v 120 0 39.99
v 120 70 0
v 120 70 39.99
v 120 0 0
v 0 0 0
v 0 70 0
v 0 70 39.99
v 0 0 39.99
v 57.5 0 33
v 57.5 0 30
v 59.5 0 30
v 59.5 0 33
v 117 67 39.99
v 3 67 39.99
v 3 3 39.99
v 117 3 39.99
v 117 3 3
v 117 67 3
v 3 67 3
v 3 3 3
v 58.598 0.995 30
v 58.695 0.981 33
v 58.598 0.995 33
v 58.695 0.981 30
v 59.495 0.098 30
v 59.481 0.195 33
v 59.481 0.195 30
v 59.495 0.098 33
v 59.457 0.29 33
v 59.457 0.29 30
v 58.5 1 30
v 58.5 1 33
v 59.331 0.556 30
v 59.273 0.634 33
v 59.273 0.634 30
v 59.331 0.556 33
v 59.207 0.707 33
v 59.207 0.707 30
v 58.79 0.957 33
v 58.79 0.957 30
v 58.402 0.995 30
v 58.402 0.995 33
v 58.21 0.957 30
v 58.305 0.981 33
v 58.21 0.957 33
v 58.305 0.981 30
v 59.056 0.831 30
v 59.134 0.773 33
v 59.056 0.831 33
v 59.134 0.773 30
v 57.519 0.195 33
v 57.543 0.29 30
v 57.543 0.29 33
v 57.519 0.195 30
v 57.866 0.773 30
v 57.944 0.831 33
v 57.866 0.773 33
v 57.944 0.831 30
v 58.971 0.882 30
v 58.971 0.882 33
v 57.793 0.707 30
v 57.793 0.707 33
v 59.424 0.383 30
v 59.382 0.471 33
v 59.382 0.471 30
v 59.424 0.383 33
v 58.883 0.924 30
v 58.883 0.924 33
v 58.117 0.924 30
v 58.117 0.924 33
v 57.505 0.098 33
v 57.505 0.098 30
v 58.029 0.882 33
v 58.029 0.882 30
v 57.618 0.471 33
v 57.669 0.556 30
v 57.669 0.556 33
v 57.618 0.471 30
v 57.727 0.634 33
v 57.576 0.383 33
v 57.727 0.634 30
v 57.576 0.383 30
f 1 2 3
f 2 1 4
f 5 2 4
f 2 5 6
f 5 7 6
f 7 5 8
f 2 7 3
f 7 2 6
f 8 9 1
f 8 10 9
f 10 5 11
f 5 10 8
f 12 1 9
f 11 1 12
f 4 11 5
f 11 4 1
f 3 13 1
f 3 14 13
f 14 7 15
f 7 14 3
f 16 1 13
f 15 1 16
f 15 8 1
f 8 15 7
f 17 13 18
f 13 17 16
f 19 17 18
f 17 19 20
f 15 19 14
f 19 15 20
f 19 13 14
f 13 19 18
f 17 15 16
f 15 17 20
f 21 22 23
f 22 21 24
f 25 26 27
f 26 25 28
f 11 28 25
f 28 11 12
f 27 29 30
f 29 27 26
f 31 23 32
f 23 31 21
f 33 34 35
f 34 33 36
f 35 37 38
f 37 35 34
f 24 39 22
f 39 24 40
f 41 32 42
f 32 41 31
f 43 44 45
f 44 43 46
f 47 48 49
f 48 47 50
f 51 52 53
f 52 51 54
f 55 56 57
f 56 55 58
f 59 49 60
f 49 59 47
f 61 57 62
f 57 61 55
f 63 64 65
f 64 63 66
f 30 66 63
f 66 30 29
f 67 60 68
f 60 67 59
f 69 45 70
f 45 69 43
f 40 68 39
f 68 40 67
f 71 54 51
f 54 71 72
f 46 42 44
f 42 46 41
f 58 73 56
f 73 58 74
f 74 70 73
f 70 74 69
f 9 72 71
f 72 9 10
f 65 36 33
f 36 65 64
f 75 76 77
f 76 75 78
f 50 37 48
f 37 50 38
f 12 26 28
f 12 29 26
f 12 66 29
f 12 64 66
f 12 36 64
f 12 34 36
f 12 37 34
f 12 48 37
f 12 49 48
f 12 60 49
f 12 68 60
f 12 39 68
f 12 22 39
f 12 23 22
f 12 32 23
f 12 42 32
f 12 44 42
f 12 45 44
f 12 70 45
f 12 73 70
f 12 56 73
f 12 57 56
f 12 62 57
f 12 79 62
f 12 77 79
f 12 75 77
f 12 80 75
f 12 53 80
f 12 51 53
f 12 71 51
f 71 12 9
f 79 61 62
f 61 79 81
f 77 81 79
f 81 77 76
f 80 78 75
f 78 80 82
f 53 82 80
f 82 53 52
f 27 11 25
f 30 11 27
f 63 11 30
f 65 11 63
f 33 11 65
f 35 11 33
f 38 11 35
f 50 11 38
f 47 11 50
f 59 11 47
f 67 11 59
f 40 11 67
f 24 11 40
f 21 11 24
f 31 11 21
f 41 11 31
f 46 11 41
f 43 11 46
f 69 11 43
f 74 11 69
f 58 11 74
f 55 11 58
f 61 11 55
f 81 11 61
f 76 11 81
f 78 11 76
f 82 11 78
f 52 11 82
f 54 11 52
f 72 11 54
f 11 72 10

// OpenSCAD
// Buffer Tank for Mini Horizontal Gel Electrophoresis
// Units: millimetres

// Outer Dimensions
$w_outer = 120; // X width
$d_outer = 70;  // Y depth
$h_outer = 40;  // Z height

// Wall and Floor Thickness
$wall_thick = 3;
$floor_thick = 3;

// Platform Dimensions
$plat_len = 60;   // Length in X
$plat_width = $d_outer; // Spans full outer width
$plat_height = 10; // Height above inner floor

// Hole Dimensions
$hole_dia = 2;
$hole_y = 0;
$hole_z = 30;

// Configuration
$fn = 64;

// Derived Dimensions
$inner_w = $w_outer - 2*$wall_thick;
$inner_d = $d_outer - 2*$wall_thick;
$inner_h = $h_outer - $floor_thick;
$plat_z_top = $floor_thick + $plat_height;

// Main Tank Construction
difference() {
    // 1. Create the solid outer block
    translate([0, 0, 0])
    cube([$w_outer, $d_outer, $h_outer], center=false);

    // 2. Cut the top opening (open-top tank)
    // Cut slightly below the top surface to ensure clean edges
    translate([0, 0, $h_outer - 0.01])
    cube([$w_outer, $d_outer, 1], center=false);

    // 3. Cut the main internal cavity (the empty space for buffer)
    // This block represents the void inside the tank walls and above the floor.
    // Position: Starts at inner wall coordinates, goes up to the top of the walls.
    // X: $wall_thick to $w_outer - $wall_thick
    // Y: $wall_thick to $d_outer - $wall_thick
    // Z: $floor_thick to $h_outer - $wall_thick (top of the wall)
    translate([$wall_thick, $wall_thick, $floor_thick])
    cube([$inner_w, $inner_d, $inner_h], center=false);

    // 4. Cut the Platform Void
    // The platform is a solid object inside the tank. We must subtract its volume.
    // Position:
    // X: Centered ($w_outer/2 - $plat_len/2)
    // Y: Spans the full inner width ($wall_thick to $d_outer - $wall_thick)
    // Z: From the top of the floor ($floor_thick) to the top of the platform ($plat_z_top)
    translate([
        ($w_outer - $plat_len)/2, 
        $wall_thick, 
        $floor_thick
    ])
    cube([$plat_len, $inner_d, $plat_height], center=false);

    // 5. Cut Electrode Holes
    // Drill 2mm diameter holes through the end walls at y=0, z=30 along X axis.
    // The hole goes through the wall thickness.
    
    // Left Hole (at negative X end)
    // Center X is at the inner face of the left wall? 
    // No, the hole is in the "end wall". The end wall is at X = +/- ($w_outer/2 - $wall_thick/2).
    // The hole is horizontal along X, so it passes through the wall thickness.
    // Center X = +/- ($w_outer/2 - $wall_thick/2)
    // Center Y = $hole_y (0)
    // Center Z = $hole_z (30)
    // Length = $wall_thick (to go through the wall)
    
    // Left Hole
    translate([
        -$w_outer/2 + $wall_thick/2, 
        $hole_y,
        $hole_z
    ])
    cylinder(h=$wall_thick, r=$hole_dia/2, $fn=$fn);
    
    // Right Hole
    translate([
        $w_outer/2 - $wall_thick/2, 
        $hole_y,
        $hole_z
    ])
    cylinder(h=$wall_thick, r=$hole_dia/2, $fn=$fn);
}
